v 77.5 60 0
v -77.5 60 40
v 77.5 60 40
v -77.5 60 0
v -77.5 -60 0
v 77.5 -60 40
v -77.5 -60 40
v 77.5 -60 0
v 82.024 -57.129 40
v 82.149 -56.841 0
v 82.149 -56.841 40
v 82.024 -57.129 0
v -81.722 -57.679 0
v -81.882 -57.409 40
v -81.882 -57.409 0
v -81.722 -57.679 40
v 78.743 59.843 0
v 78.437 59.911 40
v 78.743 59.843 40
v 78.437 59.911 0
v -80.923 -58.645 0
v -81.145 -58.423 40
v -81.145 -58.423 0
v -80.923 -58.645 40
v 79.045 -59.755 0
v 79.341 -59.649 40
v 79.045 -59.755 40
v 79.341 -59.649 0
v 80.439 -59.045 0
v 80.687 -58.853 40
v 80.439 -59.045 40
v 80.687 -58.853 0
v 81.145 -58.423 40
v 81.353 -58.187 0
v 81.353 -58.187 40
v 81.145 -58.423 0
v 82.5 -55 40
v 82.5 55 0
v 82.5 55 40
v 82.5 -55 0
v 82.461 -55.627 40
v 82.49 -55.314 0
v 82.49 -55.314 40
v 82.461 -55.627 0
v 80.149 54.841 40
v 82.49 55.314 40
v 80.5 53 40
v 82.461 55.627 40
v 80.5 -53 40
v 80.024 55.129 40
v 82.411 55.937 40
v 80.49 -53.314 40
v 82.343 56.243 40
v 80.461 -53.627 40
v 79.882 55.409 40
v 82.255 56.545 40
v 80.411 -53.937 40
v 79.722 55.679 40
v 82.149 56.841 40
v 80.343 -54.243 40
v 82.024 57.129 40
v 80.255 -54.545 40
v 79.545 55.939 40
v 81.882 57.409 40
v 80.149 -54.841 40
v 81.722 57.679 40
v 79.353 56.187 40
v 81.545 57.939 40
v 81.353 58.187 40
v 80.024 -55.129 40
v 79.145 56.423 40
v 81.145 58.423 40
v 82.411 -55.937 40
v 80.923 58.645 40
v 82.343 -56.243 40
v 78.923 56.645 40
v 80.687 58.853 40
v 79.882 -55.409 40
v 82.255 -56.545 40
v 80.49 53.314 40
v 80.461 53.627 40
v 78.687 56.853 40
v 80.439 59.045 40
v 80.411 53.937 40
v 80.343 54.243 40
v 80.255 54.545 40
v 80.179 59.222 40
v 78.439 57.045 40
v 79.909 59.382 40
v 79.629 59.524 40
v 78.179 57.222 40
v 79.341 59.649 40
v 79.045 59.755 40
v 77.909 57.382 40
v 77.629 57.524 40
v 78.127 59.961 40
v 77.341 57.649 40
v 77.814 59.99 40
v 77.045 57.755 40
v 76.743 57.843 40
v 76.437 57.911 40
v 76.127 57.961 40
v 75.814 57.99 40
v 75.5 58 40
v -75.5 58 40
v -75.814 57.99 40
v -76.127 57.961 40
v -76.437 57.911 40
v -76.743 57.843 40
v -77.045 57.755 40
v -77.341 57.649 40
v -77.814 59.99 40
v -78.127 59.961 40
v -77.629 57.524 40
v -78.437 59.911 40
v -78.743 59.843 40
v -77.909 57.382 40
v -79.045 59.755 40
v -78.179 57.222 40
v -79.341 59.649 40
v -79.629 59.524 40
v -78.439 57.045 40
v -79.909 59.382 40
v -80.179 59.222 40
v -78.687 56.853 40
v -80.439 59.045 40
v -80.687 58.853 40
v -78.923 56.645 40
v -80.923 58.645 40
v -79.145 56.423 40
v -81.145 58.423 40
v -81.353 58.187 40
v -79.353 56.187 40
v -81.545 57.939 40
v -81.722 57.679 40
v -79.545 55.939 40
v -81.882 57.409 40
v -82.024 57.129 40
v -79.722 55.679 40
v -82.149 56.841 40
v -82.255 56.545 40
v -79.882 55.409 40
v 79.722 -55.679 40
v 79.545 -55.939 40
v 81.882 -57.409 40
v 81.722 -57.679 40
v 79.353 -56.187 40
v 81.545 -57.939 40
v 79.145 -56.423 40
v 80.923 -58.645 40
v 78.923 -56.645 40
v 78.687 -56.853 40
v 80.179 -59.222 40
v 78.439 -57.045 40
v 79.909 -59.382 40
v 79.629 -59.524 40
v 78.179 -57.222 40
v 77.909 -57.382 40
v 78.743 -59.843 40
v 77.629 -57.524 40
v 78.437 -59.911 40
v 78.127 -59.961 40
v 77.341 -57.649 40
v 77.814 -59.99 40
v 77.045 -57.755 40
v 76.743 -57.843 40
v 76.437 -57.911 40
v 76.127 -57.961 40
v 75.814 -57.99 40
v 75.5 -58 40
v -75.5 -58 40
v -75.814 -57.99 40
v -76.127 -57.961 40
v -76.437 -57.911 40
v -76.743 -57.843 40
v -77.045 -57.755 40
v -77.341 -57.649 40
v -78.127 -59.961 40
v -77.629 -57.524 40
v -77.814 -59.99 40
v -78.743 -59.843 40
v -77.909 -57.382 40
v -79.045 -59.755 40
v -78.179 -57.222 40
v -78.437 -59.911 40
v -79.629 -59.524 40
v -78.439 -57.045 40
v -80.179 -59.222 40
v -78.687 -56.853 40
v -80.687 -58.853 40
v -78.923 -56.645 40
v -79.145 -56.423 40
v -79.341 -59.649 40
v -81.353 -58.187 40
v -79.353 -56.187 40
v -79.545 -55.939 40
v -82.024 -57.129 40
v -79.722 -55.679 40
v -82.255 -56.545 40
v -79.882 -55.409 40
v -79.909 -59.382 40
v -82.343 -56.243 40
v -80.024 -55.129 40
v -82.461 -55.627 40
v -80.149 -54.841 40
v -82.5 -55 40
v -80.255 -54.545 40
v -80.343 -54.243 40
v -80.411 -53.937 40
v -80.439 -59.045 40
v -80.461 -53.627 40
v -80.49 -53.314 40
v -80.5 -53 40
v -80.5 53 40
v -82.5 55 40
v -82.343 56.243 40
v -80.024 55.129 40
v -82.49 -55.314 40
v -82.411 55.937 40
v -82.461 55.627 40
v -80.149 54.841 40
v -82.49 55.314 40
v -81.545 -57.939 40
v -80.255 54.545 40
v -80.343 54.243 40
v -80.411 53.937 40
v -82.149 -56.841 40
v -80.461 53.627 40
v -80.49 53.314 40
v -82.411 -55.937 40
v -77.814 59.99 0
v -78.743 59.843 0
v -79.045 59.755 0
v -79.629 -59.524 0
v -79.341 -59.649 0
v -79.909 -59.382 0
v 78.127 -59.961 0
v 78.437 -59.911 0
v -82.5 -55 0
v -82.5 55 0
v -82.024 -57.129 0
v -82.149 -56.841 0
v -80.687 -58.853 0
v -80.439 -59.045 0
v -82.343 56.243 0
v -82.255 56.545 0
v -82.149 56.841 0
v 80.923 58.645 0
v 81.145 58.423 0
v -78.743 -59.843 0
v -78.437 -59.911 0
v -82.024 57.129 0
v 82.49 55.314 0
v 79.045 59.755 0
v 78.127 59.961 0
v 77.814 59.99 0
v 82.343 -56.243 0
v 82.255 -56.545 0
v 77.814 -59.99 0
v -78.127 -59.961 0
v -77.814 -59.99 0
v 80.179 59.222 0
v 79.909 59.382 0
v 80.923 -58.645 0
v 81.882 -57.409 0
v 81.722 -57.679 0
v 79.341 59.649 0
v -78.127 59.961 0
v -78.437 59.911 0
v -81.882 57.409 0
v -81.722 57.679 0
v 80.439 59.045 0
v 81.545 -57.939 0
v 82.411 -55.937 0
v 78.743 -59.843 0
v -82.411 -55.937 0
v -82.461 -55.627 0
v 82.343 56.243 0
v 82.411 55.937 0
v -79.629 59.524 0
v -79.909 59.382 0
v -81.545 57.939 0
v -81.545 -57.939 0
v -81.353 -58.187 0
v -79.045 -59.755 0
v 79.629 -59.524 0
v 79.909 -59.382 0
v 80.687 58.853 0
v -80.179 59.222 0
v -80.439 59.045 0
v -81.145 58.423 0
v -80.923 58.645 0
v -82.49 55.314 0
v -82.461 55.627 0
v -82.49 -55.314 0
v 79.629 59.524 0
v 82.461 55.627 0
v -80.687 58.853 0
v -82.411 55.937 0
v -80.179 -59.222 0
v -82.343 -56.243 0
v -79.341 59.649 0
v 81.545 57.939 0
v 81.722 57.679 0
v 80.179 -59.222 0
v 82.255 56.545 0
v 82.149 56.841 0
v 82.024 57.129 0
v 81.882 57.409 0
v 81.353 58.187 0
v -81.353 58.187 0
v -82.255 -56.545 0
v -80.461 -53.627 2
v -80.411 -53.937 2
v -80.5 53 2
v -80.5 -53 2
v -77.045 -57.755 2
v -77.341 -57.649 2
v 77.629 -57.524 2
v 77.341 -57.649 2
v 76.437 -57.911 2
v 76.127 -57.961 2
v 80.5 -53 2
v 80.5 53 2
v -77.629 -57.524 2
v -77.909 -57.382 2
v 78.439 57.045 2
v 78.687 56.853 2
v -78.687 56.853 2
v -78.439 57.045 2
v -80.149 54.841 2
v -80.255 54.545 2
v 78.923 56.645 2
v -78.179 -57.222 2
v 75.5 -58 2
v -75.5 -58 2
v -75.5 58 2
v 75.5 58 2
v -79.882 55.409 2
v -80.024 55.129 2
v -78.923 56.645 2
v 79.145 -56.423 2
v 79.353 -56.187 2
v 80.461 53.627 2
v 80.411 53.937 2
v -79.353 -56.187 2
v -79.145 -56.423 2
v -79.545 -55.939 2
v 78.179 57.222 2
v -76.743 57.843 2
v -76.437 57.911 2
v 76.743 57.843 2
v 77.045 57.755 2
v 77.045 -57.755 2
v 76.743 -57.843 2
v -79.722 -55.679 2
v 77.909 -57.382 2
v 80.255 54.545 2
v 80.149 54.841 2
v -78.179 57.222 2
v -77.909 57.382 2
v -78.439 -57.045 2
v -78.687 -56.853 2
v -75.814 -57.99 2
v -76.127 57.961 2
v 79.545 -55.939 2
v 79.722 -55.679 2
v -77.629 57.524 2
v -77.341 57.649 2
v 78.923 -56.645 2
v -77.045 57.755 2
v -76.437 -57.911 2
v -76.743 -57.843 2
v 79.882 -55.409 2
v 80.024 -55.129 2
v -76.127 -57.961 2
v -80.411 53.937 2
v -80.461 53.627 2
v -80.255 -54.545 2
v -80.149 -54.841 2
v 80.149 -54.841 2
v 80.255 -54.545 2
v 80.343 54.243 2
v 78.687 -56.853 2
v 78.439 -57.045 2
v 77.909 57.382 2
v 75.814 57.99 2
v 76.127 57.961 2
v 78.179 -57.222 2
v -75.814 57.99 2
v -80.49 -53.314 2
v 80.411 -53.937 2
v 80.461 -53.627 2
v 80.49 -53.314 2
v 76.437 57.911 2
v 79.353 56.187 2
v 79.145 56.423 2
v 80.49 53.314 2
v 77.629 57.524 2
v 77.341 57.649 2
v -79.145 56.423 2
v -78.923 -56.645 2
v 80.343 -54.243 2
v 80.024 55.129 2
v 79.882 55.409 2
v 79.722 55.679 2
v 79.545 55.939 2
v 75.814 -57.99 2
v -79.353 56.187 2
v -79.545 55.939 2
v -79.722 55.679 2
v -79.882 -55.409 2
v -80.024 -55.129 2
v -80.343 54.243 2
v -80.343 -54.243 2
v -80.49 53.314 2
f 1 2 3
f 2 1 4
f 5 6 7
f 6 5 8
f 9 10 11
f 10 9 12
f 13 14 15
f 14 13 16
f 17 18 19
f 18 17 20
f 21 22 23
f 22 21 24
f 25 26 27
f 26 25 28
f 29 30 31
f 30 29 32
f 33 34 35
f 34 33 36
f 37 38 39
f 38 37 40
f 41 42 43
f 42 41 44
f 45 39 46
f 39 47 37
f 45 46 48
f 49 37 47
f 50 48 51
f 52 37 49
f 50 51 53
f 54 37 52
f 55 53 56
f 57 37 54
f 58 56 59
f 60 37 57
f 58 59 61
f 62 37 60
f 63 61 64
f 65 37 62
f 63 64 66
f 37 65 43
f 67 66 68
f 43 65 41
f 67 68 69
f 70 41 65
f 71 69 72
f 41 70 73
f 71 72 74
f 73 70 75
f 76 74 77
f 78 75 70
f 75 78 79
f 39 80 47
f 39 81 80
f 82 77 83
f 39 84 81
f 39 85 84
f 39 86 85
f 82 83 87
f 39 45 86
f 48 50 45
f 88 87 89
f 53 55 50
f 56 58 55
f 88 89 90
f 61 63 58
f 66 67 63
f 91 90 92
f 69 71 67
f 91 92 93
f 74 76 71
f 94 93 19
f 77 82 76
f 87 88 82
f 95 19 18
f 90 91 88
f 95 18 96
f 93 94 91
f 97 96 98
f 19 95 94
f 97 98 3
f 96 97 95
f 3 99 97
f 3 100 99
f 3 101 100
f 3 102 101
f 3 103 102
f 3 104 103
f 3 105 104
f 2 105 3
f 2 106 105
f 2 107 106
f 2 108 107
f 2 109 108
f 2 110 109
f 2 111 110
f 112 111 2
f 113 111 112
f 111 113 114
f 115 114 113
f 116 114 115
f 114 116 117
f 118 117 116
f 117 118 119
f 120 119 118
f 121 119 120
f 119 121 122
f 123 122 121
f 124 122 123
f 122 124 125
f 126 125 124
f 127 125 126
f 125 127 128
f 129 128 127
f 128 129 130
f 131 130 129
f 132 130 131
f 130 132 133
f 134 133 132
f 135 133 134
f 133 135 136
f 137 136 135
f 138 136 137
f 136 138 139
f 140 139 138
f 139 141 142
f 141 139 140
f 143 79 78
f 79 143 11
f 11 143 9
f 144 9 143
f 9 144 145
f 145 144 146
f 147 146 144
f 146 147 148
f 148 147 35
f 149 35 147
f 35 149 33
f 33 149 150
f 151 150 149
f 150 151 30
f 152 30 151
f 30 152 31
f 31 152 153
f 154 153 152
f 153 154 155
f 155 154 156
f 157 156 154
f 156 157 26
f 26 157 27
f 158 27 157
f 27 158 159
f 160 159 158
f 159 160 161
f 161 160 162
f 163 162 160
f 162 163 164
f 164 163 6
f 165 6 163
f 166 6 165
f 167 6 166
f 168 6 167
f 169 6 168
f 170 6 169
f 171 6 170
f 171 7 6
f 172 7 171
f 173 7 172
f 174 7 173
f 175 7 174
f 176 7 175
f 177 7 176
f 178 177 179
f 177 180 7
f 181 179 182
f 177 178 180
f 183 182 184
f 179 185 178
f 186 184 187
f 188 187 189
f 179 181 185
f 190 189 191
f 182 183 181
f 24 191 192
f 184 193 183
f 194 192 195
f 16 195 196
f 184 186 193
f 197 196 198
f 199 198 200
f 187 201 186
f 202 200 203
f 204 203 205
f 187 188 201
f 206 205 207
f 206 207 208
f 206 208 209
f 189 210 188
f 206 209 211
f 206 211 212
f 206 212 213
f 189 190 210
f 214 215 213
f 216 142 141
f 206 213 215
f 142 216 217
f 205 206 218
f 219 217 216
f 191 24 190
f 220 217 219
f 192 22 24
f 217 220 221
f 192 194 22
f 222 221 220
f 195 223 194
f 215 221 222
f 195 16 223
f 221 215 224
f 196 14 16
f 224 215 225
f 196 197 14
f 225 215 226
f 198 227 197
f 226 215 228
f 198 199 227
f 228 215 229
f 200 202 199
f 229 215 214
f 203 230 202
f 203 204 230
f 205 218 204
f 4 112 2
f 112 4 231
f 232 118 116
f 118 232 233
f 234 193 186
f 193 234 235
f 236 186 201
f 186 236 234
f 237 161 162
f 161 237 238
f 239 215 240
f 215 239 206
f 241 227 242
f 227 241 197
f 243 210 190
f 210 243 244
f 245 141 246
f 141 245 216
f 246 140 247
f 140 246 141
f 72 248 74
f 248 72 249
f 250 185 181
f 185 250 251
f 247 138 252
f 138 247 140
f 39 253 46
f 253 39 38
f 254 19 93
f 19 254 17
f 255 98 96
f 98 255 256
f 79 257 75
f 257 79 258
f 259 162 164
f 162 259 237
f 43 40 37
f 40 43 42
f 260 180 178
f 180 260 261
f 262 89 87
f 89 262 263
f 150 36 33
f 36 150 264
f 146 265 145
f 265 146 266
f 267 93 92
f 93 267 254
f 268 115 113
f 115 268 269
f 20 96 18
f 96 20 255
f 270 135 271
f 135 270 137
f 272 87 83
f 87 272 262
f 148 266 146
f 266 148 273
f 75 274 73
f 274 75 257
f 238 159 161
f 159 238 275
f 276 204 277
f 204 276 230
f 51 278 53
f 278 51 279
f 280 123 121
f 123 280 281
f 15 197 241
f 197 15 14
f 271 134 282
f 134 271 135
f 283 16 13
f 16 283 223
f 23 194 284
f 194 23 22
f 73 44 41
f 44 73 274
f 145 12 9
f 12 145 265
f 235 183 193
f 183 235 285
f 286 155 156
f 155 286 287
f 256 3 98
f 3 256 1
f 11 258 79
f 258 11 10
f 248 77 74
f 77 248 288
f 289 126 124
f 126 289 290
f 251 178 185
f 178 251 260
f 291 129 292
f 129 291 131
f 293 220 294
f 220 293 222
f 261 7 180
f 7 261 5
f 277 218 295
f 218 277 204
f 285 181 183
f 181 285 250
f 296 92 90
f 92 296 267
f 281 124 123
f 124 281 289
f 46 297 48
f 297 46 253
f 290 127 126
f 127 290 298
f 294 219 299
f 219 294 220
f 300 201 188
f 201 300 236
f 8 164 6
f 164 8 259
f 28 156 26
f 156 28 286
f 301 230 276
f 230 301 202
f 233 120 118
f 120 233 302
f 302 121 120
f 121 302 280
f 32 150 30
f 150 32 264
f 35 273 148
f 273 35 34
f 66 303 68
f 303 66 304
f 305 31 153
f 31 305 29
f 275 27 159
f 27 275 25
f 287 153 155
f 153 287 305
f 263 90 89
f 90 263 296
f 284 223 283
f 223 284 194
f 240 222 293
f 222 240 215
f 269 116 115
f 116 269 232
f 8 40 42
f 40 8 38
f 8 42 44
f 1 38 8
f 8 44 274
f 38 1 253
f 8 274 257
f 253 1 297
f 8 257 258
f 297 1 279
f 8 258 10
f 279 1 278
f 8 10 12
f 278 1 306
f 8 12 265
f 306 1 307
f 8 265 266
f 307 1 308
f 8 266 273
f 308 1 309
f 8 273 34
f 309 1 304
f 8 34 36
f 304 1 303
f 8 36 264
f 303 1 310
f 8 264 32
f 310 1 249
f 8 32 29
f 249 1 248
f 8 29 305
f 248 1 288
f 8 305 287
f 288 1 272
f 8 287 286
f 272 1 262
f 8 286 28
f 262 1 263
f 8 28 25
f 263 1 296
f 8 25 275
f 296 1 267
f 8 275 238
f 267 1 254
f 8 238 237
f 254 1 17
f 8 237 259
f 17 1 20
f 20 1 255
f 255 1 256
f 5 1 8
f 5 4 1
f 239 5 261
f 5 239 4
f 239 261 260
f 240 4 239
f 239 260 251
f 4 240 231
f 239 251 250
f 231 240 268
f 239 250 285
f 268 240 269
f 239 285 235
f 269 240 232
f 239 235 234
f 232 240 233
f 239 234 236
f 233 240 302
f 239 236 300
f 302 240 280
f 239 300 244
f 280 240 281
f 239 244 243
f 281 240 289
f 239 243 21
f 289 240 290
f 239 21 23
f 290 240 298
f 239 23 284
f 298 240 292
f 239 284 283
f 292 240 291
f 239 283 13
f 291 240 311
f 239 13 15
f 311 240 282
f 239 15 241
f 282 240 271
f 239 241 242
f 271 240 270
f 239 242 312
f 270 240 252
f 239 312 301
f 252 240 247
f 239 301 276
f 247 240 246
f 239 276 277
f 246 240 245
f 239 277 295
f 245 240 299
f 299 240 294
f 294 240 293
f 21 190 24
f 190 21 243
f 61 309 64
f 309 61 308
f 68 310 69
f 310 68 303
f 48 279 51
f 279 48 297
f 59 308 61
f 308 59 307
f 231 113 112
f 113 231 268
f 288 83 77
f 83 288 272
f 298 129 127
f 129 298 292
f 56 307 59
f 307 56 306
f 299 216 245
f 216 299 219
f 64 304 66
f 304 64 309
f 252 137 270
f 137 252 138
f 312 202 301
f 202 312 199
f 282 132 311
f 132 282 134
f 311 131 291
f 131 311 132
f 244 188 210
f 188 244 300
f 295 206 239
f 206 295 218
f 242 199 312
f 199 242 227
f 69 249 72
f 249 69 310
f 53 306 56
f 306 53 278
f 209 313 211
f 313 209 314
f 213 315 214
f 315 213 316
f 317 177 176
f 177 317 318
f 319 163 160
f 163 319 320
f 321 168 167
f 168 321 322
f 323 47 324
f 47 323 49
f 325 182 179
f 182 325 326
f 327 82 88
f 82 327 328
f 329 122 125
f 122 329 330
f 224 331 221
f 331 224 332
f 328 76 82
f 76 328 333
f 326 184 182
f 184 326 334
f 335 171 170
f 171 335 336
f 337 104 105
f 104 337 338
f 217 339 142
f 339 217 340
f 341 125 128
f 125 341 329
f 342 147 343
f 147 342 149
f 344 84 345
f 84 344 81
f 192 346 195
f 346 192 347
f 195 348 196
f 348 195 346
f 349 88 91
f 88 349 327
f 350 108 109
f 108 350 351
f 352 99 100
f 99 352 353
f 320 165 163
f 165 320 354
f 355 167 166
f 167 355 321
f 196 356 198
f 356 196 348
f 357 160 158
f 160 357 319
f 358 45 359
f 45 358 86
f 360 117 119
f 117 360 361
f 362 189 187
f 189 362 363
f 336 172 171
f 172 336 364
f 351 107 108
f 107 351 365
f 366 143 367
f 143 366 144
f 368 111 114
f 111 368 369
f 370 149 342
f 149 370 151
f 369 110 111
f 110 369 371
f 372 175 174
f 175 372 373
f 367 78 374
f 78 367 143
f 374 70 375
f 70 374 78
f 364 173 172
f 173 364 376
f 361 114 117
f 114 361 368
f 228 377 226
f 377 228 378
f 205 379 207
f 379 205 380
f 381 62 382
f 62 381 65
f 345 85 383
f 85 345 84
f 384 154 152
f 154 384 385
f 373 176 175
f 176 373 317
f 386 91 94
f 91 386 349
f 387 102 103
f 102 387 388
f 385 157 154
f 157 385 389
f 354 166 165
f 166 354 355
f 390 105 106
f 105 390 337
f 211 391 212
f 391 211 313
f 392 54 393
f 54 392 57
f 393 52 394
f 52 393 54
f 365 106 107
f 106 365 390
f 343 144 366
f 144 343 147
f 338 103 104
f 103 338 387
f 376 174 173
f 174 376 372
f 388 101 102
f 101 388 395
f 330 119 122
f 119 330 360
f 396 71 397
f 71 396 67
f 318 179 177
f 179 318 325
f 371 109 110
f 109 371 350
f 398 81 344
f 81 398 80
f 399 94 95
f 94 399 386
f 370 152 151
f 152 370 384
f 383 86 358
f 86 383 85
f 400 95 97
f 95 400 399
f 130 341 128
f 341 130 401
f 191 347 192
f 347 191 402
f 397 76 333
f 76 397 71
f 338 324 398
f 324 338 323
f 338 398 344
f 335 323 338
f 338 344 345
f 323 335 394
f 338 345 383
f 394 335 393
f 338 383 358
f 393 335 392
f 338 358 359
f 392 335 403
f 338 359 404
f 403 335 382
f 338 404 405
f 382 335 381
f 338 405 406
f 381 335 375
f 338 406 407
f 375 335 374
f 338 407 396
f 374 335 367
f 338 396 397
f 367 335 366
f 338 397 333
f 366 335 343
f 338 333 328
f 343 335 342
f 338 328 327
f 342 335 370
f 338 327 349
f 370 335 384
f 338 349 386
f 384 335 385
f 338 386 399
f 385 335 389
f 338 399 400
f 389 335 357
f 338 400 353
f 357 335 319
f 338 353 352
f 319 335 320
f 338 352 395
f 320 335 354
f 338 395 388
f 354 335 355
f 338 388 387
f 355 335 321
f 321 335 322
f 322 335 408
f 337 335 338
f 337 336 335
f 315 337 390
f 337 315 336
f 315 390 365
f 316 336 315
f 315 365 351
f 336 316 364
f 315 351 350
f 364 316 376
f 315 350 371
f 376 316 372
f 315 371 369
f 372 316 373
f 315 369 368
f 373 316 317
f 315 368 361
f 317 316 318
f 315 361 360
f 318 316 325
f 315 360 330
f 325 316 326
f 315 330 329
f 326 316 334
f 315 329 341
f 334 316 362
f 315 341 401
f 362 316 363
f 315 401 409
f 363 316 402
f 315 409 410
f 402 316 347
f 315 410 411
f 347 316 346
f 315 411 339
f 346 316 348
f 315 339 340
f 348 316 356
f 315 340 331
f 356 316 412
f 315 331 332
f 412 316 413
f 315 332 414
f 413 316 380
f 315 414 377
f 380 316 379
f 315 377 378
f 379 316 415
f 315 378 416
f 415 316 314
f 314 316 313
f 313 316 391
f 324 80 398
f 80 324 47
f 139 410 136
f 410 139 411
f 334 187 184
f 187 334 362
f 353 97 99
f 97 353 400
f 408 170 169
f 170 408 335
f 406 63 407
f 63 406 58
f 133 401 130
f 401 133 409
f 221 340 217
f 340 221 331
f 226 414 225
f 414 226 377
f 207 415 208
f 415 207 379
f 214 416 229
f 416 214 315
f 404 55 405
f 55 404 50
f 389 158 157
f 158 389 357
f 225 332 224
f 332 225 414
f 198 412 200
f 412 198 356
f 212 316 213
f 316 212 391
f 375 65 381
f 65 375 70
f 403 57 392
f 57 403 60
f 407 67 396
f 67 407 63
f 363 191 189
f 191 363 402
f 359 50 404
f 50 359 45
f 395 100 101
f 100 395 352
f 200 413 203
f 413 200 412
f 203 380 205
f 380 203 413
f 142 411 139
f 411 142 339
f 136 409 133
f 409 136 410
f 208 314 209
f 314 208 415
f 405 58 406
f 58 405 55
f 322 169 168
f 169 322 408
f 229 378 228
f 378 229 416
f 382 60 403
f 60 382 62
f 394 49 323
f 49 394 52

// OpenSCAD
// file: ../Library/RoundedPlate.scad
/*
 * Library:     RoundedPlate.scad
 * Version:     1.0
 * Author:      Reinhard Loch
 * Copyright:   2024
 * License:     2-clause BSD License
 *              (http://opensource.org/licenses/BSD-2-Clause)
 */


/* [Plate Dimensions] */

// Height
h = 5; // [10:200]

// Width
w = 120; // [10:250]

// Depth
d = 80; // [10:250]

// Radius
r = 5; // [1:10]


module RoundedPlate(h = h, w = w, d = d, r = r ) {

translate([-w/2 + r, -d/2 + r, 0])

    minkowski() {
        cube([w - 2*r, d - 2*r, h/2]);
        cylinder(h = h/2, r = r);
    };
    
};

RoundedPlate();
// file: ../Library/RoundedBox.scad
/*
 * Library:     RoundedBox.scad
 * Version:     1.0
 * Author:      Reinhard Loch
 * Copyright:   2024
 * License:     2-clause BSD License
 *              (http://opensource.org/licenses/BSD-2-Clause)
 */


/* [Box Dimensions] */

// Height
h = 50; // [10:200]

// Width
w = 120; // [10:250]

// Depth
d = 80; // [10:250]

// Radius
r = 5; // [1:10]


/* [Thickness] */

// Wall Thickness
wth = 2; // [1:10]

// Bottom Thickness
bth = 3; // [1:10]


module RoundedBox(h = h, w = w, d = d, r = r, wth = wth, bth = bth) {

translate([-w/2 + r, -d/2 + r, 0])

    difference() {
    
        minkowski() {
            cube([w - 2*r, d - 2*r, h/2]);
            cylinder(h = h/2, r = r);
        };
    
        translate([wth, wth, bth])

            minkowski() {
                cube([w - 2*r - 2*wth, d - 2*r - 2*wth, h/2]);
                cylinder(h = h/2, r = r);
            };

    };
    
};

RoundedBox();
// main file
use <../Library/RoundedBox.scad>
use <../Library/RoundedPlate.scad>

$fn = $preview ? 40 : 100;

RoundedBox(h = 40, w = 165, d = 120, r = 5, wth = 2, bth = 2);

//translate([0, 0, -2])
//    RoundedPlate(h = 2.001, w = 116, d = 71, r = 5);
